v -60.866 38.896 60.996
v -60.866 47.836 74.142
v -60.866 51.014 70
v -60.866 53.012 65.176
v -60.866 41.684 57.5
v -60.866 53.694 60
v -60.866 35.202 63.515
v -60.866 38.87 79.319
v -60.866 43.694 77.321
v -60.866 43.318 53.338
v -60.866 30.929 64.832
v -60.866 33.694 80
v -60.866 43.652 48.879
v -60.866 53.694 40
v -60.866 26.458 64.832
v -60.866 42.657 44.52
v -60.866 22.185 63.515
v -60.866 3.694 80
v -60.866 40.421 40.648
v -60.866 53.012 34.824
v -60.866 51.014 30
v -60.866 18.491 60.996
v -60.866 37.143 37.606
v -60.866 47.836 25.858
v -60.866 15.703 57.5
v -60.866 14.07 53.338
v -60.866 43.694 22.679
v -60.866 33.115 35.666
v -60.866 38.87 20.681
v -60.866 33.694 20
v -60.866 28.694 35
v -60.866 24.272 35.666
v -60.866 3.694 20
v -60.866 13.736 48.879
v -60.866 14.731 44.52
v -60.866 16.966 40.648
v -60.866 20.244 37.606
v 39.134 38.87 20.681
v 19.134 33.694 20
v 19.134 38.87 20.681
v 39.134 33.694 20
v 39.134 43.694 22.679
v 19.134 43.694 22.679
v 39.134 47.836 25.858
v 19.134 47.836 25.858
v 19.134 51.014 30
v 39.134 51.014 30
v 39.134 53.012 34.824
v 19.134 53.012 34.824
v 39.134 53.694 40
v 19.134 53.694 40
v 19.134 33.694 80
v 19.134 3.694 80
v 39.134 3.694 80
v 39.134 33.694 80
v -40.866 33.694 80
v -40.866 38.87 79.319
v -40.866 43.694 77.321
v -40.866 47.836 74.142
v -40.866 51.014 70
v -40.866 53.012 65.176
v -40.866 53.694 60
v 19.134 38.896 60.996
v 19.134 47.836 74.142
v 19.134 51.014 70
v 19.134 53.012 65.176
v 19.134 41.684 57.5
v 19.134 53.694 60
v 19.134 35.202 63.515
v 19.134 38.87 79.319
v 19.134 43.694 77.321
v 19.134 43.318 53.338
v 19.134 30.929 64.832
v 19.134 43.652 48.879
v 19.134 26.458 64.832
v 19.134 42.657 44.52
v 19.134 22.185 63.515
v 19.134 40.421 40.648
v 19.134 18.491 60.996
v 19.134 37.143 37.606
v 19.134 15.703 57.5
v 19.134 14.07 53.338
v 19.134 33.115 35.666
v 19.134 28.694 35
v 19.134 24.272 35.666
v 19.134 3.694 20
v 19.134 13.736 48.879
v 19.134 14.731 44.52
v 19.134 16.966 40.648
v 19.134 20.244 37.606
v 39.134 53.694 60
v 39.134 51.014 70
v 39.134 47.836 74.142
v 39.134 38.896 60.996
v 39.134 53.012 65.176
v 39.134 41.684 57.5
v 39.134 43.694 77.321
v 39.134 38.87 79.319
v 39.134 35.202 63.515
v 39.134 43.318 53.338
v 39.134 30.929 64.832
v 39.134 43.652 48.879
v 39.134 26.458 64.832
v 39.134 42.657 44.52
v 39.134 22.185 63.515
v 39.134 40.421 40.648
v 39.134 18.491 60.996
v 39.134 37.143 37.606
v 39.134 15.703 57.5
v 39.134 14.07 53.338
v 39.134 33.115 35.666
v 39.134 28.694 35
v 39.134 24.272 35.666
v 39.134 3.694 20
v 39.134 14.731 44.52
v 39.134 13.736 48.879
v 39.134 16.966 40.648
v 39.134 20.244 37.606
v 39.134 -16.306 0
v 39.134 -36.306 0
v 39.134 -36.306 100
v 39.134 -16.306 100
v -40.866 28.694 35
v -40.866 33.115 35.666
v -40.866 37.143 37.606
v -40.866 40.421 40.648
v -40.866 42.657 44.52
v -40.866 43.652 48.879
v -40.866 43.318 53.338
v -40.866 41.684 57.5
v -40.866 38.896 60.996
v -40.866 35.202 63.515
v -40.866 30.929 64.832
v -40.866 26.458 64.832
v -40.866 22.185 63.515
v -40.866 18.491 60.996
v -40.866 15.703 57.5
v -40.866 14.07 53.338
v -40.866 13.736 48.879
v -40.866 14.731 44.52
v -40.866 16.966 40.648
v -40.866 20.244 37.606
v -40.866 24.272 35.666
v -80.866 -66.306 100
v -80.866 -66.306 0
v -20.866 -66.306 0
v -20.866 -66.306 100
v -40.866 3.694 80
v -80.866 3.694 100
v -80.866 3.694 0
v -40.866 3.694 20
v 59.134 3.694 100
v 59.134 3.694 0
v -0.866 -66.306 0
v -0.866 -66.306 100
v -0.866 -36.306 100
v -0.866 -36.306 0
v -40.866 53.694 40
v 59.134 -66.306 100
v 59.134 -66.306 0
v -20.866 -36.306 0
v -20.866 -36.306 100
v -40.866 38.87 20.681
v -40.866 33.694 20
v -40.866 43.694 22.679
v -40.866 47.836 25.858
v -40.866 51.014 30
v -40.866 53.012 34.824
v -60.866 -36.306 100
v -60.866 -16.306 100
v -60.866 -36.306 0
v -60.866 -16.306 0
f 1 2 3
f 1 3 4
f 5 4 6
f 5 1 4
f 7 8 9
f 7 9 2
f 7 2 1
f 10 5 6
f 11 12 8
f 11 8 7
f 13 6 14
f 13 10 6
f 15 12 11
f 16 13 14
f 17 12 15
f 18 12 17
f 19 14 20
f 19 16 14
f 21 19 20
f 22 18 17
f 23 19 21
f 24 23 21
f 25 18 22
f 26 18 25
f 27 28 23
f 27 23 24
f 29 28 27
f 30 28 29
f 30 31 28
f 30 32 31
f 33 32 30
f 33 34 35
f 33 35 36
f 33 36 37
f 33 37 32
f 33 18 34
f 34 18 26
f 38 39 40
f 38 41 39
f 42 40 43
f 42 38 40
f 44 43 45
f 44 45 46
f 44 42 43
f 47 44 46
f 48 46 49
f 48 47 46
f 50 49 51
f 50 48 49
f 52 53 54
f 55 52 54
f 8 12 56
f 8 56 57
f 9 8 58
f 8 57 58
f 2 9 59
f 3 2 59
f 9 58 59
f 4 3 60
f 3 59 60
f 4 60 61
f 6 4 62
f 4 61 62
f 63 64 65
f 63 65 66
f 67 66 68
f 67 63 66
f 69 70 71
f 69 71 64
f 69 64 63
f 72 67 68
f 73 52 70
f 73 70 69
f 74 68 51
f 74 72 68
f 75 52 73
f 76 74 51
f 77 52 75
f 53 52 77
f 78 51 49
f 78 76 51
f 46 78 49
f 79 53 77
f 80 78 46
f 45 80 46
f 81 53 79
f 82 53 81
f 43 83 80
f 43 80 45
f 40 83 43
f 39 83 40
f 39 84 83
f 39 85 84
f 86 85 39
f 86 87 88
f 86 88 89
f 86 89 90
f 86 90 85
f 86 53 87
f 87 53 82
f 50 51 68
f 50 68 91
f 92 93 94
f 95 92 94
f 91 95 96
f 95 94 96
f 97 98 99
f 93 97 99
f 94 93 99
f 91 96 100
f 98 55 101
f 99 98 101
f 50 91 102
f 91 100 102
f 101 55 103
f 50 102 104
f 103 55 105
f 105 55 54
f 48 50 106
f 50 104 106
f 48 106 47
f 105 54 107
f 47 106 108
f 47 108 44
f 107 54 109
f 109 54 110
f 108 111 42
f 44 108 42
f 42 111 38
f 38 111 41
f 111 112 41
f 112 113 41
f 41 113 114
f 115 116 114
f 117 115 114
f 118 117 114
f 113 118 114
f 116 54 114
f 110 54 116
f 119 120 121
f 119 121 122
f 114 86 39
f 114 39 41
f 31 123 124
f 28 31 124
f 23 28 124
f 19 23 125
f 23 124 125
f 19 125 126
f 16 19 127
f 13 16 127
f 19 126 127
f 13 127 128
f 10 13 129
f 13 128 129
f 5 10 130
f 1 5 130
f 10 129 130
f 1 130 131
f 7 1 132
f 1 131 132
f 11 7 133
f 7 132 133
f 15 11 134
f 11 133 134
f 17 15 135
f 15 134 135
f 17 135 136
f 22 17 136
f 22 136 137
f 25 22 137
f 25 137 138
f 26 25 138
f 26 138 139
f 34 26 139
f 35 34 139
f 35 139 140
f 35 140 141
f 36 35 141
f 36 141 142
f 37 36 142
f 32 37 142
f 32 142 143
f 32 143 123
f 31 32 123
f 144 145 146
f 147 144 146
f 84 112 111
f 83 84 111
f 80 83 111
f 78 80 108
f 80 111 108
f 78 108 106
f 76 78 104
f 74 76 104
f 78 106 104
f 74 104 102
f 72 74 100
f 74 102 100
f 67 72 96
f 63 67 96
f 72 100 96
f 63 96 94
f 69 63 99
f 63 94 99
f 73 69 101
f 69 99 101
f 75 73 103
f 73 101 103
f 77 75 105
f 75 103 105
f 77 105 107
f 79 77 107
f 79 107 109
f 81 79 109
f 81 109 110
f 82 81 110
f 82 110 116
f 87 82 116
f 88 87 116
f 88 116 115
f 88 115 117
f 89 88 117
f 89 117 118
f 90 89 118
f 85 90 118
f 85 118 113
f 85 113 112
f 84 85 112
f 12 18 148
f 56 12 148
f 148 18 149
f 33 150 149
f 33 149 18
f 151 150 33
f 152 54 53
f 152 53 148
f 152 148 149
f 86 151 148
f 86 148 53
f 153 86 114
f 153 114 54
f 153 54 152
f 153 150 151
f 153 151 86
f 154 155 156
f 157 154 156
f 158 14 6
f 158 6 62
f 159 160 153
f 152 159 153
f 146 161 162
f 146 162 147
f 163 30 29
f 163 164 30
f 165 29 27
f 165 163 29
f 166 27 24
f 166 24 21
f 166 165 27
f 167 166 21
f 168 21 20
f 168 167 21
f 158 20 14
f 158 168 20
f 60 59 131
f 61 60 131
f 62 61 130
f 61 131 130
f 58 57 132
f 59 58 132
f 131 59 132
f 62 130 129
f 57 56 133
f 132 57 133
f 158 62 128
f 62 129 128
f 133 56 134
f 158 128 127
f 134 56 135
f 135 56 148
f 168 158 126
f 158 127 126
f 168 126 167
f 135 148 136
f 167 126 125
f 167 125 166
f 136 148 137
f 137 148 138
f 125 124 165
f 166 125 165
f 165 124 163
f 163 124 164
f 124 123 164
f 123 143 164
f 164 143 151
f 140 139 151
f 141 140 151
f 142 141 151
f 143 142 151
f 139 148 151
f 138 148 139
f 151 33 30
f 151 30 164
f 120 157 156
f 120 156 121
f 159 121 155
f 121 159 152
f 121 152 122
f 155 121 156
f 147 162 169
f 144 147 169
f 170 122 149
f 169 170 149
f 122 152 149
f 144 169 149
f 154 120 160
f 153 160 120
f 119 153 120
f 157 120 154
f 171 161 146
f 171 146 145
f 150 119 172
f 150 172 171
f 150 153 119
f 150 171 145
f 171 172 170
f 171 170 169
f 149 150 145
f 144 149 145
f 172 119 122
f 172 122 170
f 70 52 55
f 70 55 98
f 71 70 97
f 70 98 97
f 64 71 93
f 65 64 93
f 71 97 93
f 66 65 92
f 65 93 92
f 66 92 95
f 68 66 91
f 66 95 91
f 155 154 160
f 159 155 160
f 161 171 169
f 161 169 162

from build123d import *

# Parameters (mm, degrees)
BOSS_EXTRUDE1_DEPTH = 100
SKETCH3_W           = 20
SKETCH3_H           = 60
BOSS_EXTRUDE2_DEPTH = 50
FILLET1_R           = 20
SKETCH4_R           = 15
CUT_EXTRUDE1_DEPTH  = 100


with BuildPart() as part:
    # Sketch2 → Boss-Extrude1 (new body)
    with BuildSketch(Plane.XY):
        Polygon((-80.866204042, 3.693693694), (59.133795958, 3.693693694), (59.133795958, -13.693693694), (59.133795958, -66.306306306), (38.267591916, -66.306306306), (-0.866204042, -66.306306306), (-0.866204042, -36.306306306), (39.133795958, -36.306306306), (39.133795958, -16.306306306), (-60.866204042, -16.306306306), (-60.866204042, -36.306306306), (-20.866204042, -36.306306306), (-20.866204042, -66.306306306), (-60, -66.306306306), (-80.866204042, -66.306306306), (-80.866204042, -13.693693694), align=None)
    extrude(amount=BOSS_EXTRUDE1_DEPTH)

    # Sketch3 → Boss-Extrude2 (add)
    with BuildSketch(Plane(origin=(0, 3.693693694, 0), x_dir=(1, 0, 0), z_dir=(0, 1, 0))):
        with Locations((-50.866204042, -50)):
            Rectangle(SKETCH3_W, SKETCH3_H)
        with Locations((29.133795958, -50)):
            Rectangle(SKETCH3_W, SKETCH3_H)
    extrude(amount=BOSS_EXTRUDE2_DEPTH)

    # Fillet1
    fillet1_edges = [part.edges().sort_by_distance(p)[0] for p in [
        (-50.866204042, 53.693693694, 20),
        (-50.866204042, 53.693693694, 80),
        (29.133795958, 53.693693694, 20),
        (29.133795958, 53.693693694, 80),
    ]]
    fillet(fillet1_edges, radius=FILLET1_R)

    # Sketch4 → Cut-Extrude1 (cut)
    with BuildSketch(Plane(origin=(39.133795958, 0, 0), x_dir=(0, 0, -1), z_dir=(1, 0, 0))):
        with Locations((-50, 28.693693694)):
            Circle(SKETCH4_R)
    extrude(amount=-CUT_EXTRUDE1_DEPTH, mode=Mode.SUBTRACT)


solid = part.part
